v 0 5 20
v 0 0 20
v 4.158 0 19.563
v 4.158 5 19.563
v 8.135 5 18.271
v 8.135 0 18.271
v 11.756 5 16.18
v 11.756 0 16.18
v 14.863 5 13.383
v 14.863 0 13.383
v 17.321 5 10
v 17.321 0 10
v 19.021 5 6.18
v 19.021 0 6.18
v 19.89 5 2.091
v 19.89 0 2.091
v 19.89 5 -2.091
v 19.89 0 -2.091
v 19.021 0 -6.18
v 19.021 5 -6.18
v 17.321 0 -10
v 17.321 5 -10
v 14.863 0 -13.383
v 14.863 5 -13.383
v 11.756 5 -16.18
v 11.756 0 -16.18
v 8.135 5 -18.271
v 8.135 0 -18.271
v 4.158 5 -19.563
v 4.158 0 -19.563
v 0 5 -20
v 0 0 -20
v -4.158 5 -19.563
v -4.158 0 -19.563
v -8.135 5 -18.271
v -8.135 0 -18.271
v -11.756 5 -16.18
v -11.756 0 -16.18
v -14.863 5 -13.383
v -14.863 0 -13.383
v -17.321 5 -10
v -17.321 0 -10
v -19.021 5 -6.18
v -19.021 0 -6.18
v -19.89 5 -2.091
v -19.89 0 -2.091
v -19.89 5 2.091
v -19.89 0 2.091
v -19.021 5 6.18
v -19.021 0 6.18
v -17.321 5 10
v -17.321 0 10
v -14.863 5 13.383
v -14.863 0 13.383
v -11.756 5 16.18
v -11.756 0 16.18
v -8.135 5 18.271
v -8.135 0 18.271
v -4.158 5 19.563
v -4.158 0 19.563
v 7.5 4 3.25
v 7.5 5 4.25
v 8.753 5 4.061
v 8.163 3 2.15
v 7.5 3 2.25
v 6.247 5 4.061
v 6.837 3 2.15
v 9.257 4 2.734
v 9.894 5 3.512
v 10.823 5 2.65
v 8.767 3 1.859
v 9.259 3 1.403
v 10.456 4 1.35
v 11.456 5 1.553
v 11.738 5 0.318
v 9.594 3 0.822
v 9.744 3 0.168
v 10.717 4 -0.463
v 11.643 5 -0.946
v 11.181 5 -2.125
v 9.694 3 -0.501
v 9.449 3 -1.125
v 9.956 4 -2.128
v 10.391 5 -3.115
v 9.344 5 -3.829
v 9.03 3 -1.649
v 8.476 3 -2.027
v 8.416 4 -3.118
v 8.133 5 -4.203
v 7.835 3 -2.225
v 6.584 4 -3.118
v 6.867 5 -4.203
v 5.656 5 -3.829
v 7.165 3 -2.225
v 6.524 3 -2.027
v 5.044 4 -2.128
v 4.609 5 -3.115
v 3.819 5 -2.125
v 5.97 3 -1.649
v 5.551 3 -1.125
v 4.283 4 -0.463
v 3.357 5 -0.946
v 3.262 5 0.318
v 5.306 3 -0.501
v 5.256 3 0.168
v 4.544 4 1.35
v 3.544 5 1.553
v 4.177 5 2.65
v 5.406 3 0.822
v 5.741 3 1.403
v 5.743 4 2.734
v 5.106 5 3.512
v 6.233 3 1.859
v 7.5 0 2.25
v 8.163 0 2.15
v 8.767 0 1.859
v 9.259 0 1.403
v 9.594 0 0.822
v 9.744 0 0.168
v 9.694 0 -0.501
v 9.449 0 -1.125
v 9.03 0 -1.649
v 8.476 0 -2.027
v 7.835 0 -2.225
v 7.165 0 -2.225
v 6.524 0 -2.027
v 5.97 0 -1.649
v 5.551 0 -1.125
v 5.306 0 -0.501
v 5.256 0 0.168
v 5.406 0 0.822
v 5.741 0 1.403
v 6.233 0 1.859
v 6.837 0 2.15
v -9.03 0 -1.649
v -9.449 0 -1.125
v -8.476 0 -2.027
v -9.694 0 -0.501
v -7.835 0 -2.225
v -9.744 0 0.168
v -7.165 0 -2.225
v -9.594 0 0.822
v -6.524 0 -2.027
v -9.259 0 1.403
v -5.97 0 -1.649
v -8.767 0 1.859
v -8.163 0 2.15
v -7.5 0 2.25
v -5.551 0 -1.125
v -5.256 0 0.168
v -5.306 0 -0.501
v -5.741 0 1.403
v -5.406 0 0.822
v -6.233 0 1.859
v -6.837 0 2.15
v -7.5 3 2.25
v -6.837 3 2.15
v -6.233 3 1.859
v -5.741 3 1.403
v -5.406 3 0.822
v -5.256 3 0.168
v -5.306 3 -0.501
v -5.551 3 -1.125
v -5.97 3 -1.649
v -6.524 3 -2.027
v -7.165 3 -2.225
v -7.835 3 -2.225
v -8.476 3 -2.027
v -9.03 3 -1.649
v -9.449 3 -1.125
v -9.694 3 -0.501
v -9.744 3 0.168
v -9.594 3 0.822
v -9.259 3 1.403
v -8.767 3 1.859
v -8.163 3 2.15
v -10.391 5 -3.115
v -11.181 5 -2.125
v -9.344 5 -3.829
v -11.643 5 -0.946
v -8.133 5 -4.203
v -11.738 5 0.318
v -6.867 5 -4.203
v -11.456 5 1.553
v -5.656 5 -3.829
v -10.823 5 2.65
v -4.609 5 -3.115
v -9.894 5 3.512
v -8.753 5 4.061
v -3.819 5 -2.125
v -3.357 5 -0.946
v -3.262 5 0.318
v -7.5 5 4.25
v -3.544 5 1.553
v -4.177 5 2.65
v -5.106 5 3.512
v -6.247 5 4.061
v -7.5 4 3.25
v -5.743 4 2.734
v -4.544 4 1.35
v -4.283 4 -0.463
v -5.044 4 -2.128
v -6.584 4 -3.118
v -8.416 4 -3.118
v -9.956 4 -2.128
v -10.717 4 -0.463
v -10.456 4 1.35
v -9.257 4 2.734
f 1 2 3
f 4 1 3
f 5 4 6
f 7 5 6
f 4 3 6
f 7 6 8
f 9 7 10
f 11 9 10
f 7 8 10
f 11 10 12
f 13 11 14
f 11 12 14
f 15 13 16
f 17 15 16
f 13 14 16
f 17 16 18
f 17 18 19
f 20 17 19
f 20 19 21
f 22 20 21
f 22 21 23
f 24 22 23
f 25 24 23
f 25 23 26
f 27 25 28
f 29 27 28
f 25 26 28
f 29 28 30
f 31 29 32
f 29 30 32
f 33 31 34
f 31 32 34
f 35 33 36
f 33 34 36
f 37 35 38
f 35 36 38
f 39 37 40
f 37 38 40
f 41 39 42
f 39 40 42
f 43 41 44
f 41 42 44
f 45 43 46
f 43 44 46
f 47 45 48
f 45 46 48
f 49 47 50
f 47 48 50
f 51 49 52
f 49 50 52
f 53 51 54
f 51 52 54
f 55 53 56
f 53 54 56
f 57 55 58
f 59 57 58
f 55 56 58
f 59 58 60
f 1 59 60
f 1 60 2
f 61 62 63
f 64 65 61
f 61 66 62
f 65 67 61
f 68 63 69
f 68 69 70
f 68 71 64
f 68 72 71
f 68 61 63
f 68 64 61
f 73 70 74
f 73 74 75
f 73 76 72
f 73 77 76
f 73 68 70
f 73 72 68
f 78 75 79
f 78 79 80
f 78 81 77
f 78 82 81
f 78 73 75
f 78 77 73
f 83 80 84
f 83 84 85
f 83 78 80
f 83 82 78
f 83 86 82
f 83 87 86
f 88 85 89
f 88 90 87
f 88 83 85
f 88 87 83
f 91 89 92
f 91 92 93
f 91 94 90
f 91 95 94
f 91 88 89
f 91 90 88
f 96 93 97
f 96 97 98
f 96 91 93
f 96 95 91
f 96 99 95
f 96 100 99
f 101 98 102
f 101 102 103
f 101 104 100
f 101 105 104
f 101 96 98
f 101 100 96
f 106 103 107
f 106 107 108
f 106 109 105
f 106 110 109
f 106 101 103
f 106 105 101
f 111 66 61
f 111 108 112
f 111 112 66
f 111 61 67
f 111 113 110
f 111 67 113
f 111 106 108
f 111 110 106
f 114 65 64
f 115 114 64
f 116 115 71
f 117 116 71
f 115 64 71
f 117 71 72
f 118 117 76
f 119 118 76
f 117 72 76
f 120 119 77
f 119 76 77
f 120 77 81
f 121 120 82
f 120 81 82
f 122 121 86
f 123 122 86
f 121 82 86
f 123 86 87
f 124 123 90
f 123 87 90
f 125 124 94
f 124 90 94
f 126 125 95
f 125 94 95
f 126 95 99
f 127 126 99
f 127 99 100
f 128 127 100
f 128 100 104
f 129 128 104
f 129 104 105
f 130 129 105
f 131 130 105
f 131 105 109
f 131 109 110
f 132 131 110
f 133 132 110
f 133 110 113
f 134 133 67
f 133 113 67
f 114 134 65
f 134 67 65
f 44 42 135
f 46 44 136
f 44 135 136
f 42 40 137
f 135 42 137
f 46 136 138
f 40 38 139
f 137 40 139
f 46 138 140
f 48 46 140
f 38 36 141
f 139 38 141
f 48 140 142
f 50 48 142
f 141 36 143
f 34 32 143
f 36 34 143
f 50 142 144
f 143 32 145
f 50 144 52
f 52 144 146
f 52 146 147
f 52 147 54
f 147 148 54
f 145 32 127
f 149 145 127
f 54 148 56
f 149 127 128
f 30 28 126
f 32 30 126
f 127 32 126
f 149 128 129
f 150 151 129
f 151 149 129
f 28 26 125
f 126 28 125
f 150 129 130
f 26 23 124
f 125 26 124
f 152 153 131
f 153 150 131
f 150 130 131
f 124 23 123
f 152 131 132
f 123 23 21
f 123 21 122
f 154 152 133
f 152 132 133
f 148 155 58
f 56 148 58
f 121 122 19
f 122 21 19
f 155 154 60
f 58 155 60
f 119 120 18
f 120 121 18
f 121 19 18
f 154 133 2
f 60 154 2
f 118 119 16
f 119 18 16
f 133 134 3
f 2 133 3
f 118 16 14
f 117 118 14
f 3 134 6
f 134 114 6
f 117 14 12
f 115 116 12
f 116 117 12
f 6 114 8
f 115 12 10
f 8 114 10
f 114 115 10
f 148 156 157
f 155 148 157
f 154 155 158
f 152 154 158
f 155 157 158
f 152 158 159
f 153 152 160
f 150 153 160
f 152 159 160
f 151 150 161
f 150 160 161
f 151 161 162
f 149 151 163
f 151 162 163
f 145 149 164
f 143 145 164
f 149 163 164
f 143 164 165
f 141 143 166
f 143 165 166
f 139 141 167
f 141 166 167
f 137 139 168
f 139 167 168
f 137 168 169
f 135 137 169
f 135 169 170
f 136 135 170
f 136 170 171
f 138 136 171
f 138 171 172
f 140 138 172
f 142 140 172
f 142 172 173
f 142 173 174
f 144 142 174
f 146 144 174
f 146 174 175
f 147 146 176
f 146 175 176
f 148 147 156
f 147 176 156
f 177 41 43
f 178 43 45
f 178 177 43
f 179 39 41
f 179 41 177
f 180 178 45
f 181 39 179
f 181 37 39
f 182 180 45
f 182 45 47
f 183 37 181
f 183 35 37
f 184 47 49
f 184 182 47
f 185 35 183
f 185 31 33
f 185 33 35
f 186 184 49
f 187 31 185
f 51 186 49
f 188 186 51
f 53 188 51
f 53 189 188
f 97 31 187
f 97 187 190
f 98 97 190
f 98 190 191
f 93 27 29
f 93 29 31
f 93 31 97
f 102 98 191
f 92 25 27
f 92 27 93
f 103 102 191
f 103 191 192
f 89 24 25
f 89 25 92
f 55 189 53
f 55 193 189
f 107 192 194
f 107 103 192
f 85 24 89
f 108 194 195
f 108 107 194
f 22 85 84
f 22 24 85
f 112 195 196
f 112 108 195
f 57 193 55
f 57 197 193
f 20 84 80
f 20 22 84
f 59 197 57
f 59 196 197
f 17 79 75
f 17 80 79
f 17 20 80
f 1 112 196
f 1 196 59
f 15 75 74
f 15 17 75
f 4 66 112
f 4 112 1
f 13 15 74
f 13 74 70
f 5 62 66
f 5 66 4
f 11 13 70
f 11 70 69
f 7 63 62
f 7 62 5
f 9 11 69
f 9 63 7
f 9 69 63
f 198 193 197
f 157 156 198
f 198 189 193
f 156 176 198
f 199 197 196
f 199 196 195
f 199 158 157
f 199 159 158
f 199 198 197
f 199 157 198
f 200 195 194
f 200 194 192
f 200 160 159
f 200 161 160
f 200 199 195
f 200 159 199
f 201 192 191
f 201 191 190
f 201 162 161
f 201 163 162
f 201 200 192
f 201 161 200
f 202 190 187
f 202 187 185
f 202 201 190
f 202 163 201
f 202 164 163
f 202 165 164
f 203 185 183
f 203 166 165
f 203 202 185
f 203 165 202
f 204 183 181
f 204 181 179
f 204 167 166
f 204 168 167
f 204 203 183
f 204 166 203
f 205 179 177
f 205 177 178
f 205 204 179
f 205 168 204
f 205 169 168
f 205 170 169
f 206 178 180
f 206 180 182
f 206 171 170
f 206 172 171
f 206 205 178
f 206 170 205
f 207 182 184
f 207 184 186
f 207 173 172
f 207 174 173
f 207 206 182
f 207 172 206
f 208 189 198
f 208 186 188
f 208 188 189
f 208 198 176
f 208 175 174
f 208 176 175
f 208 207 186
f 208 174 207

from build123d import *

# Parameters (mm, degrees)
SKETCH1_R           = 20
BOSS_EXTRUDE1_DEPTH = 5
SKETCH2_R           = 2.25
CUT_EXTRUDE1_DEPTH  = 5
CHAMFER1_SIZE       = 2


with BuildPart() as part:
    # Sketch1 → Boss-Extrude1 (new body)
    with BuildSketch(Plane(origin=(0, 0, 0), x_dir=(1, 0, 0), z_dir=(0, 1, 0))):
        with Locations(Location((0, 0, 0), (0, 0, 270))):
            Circle(SKETCH1_R)
    extrude(amount=BOSS_EXTRUDE1_DEPTH)

    # Sketch2 → Cut-Extrude1 (cut)
    with BuildSketch(Plane(origin=(0, 5, 0), x_dir=(1, 0, 0), z_dir=(0, 1, 0))):
        with Locations(Location((-7.5, 0, 0), (0, 0, 270))):
            Circle(SKETCH2_R)
        with Locations(Location((7.5, 0, 0), (0, 0, 270))):
            Circle(SKETCH2_R)
    extrude(amount=-CUT_EXTRUDE1_DEPTH, mode=Mode.SUBTRACT)

    # Chamfer1
    chamfer1_edges = [part.edges().sort_by_distance(p)[0] for p in [
        (7.5, 5, -2.25),
        (-7.5, 5, -2.25),
    ]]
    chamfer(chamfer1_edges, length=CHAMFER1_SIZE)


solid = part.part
